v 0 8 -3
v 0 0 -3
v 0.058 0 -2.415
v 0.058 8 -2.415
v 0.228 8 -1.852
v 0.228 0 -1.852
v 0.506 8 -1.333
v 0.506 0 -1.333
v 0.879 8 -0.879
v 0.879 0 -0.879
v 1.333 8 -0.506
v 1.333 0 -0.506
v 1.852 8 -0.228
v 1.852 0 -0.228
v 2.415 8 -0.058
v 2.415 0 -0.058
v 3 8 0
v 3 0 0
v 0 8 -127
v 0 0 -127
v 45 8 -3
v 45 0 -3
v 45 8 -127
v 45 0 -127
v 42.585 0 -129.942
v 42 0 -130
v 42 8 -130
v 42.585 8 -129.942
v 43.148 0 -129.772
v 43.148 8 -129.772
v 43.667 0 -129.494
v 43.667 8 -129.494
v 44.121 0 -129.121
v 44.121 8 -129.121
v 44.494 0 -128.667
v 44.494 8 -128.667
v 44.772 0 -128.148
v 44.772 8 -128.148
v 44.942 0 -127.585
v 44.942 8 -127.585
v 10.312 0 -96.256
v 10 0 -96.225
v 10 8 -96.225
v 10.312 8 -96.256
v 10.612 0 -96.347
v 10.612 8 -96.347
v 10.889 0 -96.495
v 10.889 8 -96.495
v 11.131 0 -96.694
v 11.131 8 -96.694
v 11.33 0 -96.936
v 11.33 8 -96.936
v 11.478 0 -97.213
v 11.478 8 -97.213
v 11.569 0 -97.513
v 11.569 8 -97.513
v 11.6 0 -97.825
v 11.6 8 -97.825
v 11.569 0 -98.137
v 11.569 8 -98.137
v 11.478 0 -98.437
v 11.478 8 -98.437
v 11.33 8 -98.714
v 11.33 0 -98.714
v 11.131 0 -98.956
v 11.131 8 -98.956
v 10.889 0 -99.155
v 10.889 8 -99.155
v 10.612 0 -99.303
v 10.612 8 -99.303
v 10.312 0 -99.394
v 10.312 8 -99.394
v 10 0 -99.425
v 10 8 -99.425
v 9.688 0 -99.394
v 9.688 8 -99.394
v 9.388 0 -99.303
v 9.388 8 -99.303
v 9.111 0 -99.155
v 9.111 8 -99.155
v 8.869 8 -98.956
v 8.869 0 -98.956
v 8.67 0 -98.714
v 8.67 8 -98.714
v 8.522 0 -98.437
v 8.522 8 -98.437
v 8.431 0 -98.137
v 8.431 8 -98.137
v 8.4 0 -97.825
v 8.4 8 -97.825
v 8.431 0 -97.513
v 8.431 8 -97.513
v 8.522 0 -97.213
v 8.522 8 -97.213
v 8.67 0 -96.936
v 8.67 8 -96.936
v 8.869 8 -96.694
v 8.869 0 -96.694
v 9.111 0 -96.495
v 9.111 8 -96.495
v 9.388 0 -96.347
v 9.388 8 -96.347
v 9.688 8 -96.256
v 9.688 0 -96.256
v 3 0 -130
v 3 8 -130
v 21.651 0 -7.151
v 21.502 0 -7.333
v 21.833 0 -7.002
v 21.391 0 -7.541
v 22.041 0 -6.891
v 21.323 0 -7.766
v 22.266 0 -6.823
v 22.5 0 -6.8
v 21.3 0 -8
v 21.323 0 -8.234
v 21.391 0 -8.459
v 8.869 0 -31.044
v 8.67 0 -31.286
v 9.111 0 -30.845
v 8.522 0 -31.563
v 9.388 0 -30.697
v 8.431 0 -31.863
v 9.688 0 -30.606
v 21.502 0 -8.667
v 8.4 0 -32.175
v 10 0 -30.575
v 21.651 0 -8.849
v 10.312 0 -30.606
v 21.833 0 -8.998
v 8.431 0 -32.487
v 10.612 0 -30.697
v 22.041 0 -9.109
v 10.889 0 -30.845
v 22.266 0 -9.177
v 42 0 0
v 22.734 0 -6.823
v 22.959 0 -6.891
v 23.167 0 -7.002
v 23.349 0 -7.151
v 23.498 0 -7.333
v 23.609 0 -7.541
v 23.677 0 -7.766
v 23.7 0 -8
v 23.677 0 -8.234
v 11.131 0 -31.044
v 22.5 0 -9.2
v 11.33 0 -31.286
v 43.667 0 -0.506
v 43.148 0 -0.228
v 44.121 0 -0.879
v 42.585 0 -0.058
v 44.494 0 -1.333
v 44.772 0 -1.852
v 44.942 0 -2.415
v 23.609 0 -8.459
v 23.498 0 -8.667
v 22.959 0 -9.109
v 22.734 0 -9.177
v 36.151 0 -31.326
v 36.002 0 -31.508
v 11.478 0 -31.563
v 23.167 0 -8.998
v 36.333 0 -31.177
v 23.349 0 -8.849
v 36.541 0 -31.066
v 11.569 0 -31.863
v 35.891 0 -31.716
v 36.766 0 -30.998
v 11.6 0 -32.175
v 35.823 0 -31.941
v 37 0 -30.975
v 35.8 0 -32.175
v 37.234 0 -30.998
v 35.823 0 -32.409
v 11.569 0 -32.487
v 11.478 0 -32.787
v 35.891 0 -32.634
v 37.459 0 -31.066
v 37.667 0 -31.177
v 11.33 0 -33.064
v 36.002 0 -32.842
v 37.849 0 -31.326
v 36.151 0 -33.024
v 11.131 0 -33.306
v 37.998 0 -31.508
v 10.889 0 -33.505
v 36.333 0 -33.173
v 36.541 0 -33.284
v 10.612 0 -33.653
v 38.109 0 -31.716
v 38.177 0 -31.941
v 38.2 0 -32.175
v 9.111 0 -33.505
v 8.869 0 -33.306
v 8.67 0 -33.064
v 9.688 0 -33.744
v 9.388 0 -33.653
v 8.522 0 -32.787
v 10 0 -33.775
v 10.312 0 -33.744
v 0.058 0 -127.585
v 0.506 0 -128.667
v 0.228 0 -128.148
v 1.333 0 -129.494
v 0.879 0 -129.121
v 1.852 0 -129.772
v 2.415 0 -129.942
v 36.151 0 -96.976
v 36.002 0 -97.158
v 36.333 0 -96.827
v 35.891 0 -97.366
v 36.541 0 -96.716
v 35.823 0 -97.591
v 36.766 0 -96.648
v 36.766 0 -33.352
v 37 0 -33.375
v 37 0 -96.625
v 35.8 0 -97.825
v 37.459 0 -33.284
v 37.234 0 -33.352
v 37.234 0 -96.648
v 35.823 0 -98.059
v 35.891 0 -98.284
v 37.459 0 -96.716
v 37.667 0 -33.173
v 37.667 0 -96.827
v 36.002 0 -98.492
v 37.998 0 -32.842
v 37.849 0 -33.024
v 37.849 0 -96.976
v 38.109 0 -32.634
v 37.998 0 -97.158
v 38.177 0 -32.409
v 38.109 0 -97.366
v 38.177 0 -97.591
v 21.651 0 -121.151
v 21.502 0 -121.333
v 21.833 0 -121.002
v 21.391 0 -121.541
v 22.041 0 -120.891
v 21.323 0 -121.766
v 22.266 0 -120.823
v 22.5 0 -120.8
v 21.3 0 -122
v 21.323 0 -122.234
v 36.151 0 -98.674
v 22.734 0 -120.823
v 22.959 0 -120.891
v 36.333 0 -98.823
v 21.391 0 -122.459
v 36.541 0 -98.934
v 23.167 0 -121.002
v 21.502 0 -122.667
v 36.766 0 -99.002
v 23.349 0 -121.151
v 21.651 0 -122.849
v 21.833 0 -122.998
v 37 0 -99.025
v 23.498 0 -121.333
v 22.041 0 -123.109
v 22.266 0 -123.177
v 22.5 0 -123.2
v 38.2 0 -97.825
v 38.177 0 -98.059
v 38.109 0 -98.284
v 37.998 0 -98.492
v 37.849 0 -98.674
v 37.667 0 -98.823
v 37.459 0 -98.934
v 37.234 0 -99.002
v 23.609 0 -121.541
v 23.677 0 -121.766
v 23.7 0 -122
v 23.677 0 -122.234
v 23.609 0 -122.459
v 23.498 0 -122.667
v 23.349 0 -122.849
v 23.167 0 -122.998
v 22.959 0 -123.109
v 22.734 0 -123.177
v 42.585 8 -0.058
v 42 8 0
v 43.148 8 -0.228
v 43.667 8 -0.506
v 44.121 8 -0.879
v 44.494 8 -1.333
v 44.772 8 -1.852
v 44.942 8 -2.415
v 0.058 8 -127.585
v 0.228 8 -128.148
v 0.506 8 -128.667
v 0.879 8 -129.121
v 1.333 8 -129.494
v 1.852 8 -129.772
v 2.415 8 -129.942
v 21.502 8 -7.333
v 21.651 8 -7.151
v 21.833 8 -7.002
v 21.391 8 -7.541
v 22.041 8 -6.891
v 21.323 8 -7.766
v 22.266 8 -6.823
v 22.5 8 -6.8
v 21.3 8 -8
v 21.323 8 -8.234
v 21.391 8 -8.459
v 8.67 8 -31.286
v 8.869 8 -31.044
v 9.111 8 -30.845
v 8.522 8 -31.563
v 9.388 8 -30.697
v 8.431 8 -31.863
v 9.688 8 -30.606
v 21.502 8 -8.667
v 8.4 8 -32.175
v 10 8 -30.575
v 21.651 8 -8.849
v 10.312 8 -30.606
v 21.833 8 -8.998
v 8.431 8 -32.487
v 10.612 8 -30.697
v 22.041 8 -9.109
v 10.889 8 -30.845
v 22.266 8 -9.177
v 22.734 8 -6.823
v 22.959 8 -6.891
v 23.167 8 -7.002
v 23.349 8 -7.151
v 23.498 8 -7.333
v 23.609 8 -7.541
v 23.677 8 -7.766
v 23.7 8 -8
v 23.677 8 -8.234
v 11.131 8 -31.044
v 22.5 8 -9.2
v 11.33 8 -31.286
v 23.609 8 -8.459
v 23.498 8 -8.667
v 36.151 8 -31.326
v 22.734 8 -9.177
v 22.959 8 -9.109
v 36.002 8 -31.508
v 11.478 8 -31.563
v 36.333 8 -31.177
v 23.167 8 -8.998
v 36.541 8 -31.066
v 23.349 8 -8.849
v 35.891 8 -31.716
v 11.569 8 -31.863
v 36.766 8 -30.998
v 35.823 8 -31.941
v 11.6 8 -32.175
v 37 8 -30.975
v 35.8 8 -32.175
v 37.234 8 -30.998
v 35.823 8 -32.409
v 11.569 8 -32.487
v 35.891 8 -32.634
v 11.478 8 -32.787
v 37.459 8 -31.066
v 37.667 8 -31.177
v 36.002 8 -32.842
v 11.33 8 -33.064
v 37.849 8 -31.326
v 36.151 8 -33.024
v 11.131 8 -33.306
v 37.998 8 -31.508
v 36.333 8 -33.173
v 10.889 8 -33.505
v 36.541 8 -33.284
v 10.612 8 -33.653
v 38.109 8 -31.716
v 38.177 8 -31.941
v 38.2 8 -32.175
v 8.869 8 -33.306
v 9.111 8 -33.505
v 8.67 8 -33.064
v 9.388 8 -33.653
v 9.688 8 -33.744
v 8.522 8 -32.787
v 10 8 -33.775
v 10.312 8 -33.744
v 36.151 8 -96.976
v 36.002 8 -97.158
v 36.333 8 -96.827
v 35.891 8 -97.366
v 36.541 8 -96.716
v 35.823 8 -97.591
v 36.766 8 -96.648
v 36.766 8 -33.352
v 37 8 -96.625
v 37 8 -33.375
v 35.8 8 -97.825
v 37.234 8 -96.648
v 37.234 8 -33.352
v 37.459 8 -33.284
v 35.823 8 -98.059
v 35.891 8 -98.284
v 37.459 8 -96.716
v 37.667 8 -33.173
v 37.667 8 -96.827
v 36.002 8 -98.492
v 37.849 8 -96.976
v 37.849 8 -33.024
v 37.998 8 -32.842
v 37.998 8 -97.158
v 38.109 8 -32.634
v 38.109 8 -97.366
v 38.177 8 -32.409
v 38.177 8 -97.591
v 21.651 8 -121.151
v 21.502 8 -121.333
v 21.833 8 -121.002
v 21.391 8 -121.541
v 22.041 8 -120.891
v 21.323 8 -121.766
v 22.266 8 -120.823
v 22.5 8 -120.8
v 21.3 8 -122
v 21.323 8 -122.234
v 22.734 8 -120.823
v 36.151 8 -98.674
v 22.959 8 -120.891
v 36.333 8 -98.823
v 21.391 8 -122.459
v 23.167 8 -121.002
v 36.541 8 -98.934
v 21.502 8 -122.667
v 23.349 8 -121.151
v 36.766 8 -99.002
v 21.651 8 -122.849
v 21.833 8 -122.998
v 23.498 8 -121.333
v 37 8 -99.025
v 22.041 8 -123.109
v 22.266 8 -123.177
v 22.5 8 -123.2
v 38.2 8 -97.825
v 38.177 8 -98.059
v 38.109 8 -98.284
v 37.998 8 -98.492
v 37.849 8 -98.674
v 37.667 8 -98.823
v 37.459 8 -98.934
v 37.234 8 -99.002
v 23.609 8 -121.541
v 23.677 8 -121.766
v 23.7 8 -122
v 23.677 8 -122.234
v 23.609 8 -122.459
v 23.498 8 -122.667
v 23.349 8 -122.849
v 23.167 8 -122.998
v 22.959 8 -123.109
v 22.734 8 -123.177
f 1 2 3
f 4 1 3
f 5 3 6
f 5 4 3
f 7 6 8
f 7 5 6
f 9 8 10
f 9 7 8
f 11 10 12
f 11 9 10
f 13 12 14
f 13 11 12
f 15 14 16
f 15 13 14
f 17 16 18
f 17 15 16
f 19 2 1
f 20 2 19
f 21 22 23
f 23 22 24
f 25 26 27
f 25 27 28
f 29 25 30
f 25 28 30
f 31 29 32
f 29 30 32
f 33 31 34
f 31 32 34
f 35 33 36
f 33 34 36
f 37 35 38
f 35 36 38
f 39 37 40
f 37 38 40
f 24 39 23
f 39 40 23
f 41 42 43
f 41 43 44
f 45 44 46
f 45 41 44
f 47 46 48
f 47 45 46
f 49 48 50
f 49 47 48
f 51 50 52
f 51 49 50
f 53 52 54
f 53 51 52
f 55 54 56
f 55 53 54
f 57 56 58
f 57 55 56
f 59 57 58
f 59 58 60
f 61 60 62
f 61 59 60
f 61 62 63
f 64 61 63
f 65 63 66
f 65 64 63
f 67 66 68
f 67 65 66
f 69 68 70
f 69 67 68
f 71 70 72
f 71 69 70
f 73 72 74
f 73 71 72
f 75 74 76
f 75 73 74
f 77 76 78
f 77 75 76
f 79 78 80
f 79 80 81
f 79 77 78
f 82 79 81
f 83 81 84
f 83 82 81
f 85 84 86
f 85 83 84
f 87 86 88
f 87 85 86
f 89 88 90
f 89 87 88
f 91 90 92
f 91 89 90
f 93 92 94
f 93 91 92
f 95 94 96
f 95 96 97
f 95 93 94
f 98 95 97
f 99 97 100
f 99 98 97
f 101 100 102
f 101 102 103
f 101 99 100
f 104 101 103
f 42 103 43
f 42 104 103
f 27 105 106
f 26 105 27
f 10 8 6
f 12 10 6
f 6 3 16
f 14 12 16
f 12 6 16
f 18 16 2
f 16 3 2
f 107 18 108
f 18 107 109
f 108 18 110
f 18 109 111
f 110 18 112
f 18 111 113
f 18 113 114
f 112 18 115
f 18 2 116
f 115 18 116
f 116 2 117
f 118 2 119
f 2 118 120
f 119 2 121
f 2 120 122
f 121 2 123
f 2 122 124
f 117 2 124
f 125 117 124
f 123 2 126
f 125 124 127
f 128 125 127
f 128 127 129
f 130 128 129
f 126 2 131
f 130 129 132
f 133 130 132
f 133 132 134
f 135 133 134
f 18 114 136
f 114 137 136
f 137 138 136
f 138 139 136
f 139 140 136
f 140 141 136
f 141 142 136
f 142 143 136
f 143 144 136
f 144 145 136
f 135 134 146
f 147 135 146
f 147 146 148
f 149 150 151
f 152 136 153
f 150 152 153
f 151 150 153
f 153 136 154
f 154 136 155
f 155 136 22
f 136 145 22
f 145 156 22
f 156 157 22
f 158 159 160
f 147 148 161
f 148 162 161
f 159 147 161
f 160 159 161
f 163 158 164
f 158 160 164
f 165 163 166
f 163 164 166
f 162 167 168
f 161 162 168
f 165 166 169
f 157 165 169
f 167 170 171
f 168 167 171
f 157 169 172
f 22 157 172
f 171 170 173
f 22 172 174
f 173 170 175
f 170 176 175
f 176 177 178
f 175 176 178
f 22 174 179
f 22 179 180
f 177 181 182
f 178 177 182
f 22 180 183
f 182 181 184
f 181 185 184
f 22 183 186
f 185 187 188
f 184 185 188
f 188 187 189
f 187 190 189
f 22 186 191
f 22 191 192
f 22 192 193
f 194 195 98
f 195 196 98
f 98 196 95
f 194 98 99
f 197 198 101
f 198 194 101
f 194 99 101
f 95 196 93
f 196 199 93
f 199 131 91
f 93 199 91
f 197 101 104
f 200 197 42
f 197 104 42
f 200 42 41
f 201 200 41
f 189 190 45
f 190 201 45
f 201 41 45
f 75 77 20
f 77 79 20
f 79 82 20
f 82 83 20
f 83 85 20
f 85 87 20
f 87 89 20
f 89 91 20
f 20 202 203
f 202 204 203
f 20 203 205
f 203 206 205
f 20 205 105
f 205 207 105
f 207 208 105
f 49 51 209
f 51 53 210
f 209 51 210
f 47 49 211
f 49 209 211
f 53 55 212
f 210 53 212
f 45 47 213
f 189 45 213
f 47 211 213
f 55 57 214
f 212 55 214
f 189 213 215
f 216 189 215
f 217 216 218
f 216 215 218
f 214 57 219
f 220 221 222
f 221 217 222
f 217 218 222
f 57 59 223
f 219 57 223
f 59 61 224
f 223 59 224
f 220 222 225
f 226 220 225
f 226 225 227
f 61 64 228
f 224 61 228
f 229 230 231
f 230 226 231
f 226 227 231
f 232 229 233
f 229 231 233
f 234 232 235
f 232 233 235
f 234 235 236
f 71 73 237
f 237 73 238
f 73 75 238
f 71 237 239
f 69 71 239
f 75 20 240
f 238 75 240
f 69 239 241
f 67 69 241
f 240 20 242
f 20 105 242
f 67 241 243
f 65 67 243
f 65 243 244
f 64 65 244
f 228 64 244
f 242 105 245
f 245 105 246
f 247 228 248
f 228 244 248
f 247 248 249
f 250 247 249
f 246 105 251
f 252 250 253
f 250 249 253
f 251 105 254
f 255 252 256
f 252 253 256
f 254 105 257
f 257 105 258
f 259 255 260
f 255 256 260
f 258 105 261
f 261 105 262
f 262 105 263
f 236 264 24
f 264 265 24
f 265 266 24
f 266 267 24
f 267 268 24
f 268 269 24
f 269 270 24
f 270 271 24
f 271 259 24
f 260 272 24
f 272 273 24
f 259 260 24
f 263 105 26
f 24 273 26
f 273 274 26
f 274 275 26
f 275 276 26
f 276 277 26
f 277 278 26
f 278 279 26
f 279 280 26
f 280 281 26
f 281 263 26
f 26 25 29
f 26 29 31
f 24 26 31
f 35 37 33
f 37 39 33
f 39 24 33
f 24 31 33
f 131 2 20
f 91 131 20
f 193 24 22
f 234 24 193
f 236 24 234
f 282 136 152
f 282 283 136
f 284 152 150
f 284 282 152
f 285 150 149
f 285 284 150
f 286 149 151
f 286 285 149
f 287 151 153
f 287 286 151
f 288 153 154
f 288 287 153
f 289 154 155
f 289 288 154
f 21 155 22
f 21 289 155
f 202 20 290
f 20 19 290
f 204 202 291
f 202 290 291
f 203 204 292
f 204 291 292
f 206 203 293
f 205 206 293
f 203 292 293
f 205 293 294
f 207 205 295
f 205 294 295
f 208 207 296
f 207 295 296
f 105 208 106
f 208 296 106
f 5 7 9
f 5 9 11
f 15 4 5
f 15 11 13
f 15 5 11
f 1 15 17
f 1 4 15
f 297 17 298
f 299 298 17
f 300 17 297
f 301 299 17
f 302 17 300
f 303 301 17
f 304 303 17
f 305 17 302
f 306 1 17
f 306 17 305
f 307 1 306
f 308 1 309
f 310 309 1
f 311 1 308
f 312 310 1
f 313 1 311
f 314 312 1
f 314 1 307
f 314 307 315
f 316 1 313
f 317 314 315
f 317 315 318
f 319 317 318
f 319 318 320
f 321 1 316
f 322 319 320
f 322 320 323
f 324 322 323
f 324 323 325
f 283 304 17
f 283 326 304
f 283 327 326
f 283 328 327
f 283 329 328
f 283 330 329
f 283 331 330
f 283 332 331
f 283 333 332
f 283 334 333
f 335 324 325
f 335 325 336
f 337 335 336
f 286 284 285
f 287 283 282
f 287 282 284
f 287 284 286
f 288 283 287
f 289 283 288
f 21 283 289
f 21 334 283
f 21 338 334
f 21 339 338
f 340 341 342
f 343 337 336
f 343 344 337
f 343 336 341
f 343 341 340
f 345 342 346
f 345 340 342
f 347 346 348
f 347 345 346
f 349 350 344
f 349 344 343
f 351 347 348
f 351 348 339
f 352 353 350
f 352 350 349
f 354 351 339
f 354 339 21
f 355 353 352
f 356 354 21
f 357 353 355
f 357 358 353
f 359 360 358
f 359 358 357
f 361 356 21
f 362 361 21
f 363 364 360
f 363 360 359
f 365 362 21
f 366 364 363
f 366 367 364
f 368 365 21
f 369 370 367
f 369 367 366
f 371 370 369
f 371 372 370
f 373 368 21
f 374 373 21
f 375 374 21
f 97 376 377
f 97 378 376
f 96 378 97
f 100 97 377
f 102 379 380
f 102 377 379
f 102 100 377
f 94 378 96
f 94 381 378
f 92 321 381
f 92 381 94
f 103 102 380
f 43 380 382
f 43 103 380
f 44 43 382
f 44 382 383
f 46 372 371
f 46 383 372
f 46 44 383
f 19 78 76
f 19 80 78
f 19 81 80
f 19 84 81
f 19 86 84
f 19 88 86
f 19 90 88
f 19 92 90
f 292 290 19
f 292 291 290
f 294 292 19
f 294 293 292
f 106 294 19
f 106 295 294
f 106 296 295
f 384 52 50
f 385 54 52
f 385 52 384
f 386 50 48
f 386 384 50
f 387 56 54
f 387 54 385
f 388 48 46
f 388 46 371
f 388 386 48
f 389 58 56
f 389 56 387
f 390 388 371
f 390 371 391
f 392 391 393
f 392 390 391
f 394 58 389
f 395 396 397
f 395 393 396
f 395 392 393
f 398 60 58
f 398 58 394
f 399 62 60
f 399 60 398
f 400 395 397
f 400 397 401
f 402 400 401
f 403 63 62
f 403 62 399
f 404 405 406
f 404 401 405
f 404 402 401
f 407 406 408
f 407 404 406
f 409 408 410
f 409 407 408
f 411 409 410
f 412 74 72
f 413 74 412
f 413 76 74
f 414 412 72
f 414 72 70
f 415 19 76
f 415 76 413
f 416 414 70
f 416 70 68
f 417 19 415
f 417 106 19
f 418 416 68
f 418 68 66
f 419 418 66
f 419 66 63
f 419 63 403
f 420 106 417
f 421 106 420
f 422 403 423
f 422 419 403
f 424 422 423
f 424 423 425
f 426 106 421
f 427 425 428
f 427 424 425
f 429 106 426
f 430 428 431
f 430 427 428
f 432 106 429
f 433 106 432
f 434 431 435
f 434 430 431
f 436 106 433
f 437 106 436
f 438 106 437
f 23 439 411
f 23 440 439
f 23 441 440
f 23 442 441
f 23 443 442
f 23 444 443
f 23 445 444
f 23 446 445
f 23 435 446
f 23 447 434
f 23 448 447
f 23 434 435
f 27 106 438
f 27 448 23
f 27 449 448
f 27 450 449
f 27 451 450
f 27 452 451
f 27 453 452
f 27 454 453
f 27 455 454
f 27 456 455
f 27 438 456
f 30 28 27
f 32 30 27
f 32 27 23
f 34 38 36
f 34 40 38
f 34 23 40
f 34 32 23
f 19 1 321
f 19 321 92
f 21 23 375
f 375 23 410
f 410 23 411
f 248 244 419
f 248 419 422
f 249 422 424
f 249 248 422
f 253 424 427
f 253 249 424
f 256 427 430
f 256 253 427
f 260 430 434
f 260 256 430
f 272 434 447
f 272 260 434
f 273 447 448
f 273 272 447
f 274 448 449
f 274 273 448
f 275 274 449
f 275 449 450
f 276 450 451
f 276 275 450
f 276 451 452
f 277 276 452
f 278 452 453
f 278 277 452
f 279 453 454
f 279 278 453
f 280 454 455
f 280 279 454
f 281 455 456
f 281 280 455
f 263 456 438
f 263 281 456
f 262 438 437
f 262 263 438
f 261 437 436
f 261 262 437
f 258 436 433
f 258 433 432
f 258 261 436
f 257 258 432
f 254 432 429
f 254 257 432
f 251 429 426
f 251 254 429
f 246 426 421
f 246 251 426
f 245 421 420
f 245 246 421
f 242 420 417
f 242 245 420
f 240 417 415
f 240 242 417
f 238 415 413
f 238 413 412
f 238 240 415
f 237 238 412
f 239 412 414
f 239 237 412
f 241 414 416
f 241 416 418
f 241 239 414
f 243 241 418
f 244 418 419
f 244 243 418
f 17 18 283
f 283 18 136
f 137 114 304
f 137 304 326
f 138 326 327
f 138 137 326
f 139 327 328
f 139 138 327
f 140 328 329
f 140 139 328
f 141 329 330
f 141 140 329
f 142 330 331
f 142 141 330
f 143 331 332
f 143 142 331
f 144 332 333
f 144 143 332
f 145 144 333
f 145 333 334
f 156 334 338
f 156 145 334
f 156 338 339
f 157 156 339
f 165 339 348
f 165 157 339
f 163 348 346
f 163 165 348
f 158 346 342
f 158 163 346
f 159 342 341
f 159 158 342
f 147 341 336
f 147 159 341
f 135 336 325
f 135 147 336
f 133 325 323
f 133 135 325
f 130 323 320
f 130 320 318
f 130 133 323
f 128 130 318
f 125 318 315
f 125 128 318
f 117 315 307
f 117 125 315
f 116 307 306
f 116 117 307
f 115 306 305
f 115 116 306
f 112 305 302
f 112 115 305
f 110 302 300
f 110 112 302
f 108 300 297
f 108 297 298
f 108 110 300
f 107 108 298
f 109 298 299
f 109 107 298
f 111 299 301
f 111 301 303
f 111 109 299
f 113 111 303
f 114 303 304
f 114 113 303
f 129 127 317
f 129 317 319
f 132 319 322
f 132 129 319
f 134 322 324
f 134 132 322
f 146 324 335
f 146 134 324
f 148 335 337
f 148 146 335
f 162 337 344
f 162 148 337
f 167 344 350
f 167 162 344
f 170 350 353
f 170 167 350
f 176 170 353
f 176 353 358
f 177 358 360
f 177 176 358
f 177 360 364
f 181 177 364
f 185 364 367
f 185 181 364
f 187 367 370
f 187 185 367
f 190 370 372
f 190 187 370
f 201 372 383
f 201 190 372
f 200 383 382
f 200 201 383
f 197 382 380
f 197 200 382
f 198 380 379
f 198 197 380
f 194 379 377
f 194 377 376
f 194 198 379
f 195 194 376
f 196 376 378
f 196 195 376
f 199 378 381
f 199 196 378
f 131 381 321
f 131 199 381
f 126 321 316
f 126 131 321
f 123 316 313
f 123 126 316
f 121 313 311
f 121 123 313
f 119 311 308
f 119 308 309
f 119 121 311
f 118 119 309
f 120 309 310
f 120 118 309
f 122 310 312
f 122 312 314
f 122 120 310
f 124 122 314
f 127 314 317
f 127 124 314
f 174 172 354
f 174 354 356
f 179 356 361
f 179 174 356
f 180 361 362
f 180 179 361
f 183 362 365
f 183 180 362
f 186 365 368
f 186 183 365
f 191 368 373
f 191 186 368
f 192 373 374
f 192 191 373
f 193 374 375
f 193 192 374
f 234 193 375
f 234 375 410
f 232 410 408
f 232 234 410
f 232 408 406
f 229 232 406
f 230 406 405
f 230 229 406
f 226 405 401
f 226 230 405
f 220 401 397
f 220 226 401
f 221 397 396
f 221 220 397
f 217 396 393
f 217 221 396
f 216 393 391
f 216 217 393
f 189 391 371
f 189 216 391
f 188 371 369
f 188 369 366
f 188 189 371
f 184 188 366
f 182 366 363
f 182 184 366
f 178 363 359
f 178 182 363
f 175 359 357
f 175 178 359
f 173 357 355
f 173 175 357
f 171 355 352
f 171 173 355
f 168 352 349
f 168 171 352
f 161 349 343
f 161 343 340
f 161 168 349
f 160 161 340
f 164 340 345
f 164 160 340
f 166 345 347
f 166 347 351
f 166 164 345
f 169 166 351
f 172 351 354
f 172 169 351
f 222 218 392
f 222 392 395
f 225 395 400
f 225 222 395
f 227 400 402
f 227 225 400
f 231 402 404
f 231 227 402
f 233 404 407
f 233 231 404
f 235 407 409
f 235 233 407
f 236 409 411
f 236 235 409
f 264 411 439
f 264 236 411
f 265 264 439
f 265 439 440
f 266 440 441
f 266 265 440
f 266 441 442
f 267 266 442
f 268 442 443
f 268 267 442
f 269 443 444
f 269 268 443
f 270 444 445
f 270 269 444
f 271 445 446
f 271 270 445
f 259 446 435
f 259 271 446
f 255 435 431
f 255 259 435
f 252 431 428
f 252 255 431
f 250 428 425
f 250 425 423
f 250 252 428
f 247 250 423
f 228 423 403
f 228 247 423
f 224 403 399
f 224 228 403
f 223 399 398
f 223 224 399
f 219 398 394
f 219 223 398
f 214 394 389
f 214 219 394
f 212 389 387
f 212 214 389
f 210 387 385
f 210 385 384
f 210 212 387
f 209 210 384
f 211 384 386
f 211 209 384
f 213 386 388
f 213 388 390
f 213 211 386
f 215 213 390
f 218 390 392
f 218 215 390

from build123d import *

# Parameters (mm, degrees)
SKETCH1_W           = 45
SKETCH1_H           = 130
SKETCH1_R           = 1.6
SKETCH1_R_2         = 1.2
BOSS_EXTRUDE1_DEPTH = 8
FILLET1_R           = 3


with BuildPart() as part:
    # Sketch1 → Boss-Extrude1 (new body)
    with BuildSketch(Plane(origin=(0, 0, 0), x_dir=(1, 0, 0), z_dir=(0, 1, 0))):
        with Locations((22.5, 65)):
            Rectangle(SKETCH1_W, SKETCH1_H)
        with Locations(Location((10, 97.825, 0), (0, 0, 270))):
            Circle(SKETCH1_R, mode=Mode.SUBTRACT)
        with Locations(Location((10, 32.175, 0), (0, 0, 270))):
            Circle(SKETCH1_R, mode=Mode.SUBTRACT)
        with Locations(Location((37, 97.825, 0), (0, 0, 270))):
            Circle(SKETCH1_R_2, mode=Mode.SUBTRACT)
        with Locations(Location((37, 32.175, 0), (0, 0, 270))):
            Circle(SKETCH1_R_2, mode=Mode.SUBTRACT)
        with Locations(Location((22.5, 8, 0), (0, 0, 270))):
            Circle(SKETCH1_R_2, mode=Mode.SUBTRACT)
        with Locations(Location((22.5, 122, 0), (0, 0, 270))):
            Circle(SKETCH1_R_2, mode=Mode.SUBTRACT)
    extrude(amount=BOSS_EXTRUDE1_DEPTH)

    # Fillet1
    fillet1_edges = [part.edges().sort_by_distance(p)[0] for p in [
        (0, 4, 0),
        (0, 4, -130),
        (45, 4, -130),
        (45, 4, 0),
    ]]
    fillet(fillet1_edges, radius=FILLET1_R)


solid = part.part
